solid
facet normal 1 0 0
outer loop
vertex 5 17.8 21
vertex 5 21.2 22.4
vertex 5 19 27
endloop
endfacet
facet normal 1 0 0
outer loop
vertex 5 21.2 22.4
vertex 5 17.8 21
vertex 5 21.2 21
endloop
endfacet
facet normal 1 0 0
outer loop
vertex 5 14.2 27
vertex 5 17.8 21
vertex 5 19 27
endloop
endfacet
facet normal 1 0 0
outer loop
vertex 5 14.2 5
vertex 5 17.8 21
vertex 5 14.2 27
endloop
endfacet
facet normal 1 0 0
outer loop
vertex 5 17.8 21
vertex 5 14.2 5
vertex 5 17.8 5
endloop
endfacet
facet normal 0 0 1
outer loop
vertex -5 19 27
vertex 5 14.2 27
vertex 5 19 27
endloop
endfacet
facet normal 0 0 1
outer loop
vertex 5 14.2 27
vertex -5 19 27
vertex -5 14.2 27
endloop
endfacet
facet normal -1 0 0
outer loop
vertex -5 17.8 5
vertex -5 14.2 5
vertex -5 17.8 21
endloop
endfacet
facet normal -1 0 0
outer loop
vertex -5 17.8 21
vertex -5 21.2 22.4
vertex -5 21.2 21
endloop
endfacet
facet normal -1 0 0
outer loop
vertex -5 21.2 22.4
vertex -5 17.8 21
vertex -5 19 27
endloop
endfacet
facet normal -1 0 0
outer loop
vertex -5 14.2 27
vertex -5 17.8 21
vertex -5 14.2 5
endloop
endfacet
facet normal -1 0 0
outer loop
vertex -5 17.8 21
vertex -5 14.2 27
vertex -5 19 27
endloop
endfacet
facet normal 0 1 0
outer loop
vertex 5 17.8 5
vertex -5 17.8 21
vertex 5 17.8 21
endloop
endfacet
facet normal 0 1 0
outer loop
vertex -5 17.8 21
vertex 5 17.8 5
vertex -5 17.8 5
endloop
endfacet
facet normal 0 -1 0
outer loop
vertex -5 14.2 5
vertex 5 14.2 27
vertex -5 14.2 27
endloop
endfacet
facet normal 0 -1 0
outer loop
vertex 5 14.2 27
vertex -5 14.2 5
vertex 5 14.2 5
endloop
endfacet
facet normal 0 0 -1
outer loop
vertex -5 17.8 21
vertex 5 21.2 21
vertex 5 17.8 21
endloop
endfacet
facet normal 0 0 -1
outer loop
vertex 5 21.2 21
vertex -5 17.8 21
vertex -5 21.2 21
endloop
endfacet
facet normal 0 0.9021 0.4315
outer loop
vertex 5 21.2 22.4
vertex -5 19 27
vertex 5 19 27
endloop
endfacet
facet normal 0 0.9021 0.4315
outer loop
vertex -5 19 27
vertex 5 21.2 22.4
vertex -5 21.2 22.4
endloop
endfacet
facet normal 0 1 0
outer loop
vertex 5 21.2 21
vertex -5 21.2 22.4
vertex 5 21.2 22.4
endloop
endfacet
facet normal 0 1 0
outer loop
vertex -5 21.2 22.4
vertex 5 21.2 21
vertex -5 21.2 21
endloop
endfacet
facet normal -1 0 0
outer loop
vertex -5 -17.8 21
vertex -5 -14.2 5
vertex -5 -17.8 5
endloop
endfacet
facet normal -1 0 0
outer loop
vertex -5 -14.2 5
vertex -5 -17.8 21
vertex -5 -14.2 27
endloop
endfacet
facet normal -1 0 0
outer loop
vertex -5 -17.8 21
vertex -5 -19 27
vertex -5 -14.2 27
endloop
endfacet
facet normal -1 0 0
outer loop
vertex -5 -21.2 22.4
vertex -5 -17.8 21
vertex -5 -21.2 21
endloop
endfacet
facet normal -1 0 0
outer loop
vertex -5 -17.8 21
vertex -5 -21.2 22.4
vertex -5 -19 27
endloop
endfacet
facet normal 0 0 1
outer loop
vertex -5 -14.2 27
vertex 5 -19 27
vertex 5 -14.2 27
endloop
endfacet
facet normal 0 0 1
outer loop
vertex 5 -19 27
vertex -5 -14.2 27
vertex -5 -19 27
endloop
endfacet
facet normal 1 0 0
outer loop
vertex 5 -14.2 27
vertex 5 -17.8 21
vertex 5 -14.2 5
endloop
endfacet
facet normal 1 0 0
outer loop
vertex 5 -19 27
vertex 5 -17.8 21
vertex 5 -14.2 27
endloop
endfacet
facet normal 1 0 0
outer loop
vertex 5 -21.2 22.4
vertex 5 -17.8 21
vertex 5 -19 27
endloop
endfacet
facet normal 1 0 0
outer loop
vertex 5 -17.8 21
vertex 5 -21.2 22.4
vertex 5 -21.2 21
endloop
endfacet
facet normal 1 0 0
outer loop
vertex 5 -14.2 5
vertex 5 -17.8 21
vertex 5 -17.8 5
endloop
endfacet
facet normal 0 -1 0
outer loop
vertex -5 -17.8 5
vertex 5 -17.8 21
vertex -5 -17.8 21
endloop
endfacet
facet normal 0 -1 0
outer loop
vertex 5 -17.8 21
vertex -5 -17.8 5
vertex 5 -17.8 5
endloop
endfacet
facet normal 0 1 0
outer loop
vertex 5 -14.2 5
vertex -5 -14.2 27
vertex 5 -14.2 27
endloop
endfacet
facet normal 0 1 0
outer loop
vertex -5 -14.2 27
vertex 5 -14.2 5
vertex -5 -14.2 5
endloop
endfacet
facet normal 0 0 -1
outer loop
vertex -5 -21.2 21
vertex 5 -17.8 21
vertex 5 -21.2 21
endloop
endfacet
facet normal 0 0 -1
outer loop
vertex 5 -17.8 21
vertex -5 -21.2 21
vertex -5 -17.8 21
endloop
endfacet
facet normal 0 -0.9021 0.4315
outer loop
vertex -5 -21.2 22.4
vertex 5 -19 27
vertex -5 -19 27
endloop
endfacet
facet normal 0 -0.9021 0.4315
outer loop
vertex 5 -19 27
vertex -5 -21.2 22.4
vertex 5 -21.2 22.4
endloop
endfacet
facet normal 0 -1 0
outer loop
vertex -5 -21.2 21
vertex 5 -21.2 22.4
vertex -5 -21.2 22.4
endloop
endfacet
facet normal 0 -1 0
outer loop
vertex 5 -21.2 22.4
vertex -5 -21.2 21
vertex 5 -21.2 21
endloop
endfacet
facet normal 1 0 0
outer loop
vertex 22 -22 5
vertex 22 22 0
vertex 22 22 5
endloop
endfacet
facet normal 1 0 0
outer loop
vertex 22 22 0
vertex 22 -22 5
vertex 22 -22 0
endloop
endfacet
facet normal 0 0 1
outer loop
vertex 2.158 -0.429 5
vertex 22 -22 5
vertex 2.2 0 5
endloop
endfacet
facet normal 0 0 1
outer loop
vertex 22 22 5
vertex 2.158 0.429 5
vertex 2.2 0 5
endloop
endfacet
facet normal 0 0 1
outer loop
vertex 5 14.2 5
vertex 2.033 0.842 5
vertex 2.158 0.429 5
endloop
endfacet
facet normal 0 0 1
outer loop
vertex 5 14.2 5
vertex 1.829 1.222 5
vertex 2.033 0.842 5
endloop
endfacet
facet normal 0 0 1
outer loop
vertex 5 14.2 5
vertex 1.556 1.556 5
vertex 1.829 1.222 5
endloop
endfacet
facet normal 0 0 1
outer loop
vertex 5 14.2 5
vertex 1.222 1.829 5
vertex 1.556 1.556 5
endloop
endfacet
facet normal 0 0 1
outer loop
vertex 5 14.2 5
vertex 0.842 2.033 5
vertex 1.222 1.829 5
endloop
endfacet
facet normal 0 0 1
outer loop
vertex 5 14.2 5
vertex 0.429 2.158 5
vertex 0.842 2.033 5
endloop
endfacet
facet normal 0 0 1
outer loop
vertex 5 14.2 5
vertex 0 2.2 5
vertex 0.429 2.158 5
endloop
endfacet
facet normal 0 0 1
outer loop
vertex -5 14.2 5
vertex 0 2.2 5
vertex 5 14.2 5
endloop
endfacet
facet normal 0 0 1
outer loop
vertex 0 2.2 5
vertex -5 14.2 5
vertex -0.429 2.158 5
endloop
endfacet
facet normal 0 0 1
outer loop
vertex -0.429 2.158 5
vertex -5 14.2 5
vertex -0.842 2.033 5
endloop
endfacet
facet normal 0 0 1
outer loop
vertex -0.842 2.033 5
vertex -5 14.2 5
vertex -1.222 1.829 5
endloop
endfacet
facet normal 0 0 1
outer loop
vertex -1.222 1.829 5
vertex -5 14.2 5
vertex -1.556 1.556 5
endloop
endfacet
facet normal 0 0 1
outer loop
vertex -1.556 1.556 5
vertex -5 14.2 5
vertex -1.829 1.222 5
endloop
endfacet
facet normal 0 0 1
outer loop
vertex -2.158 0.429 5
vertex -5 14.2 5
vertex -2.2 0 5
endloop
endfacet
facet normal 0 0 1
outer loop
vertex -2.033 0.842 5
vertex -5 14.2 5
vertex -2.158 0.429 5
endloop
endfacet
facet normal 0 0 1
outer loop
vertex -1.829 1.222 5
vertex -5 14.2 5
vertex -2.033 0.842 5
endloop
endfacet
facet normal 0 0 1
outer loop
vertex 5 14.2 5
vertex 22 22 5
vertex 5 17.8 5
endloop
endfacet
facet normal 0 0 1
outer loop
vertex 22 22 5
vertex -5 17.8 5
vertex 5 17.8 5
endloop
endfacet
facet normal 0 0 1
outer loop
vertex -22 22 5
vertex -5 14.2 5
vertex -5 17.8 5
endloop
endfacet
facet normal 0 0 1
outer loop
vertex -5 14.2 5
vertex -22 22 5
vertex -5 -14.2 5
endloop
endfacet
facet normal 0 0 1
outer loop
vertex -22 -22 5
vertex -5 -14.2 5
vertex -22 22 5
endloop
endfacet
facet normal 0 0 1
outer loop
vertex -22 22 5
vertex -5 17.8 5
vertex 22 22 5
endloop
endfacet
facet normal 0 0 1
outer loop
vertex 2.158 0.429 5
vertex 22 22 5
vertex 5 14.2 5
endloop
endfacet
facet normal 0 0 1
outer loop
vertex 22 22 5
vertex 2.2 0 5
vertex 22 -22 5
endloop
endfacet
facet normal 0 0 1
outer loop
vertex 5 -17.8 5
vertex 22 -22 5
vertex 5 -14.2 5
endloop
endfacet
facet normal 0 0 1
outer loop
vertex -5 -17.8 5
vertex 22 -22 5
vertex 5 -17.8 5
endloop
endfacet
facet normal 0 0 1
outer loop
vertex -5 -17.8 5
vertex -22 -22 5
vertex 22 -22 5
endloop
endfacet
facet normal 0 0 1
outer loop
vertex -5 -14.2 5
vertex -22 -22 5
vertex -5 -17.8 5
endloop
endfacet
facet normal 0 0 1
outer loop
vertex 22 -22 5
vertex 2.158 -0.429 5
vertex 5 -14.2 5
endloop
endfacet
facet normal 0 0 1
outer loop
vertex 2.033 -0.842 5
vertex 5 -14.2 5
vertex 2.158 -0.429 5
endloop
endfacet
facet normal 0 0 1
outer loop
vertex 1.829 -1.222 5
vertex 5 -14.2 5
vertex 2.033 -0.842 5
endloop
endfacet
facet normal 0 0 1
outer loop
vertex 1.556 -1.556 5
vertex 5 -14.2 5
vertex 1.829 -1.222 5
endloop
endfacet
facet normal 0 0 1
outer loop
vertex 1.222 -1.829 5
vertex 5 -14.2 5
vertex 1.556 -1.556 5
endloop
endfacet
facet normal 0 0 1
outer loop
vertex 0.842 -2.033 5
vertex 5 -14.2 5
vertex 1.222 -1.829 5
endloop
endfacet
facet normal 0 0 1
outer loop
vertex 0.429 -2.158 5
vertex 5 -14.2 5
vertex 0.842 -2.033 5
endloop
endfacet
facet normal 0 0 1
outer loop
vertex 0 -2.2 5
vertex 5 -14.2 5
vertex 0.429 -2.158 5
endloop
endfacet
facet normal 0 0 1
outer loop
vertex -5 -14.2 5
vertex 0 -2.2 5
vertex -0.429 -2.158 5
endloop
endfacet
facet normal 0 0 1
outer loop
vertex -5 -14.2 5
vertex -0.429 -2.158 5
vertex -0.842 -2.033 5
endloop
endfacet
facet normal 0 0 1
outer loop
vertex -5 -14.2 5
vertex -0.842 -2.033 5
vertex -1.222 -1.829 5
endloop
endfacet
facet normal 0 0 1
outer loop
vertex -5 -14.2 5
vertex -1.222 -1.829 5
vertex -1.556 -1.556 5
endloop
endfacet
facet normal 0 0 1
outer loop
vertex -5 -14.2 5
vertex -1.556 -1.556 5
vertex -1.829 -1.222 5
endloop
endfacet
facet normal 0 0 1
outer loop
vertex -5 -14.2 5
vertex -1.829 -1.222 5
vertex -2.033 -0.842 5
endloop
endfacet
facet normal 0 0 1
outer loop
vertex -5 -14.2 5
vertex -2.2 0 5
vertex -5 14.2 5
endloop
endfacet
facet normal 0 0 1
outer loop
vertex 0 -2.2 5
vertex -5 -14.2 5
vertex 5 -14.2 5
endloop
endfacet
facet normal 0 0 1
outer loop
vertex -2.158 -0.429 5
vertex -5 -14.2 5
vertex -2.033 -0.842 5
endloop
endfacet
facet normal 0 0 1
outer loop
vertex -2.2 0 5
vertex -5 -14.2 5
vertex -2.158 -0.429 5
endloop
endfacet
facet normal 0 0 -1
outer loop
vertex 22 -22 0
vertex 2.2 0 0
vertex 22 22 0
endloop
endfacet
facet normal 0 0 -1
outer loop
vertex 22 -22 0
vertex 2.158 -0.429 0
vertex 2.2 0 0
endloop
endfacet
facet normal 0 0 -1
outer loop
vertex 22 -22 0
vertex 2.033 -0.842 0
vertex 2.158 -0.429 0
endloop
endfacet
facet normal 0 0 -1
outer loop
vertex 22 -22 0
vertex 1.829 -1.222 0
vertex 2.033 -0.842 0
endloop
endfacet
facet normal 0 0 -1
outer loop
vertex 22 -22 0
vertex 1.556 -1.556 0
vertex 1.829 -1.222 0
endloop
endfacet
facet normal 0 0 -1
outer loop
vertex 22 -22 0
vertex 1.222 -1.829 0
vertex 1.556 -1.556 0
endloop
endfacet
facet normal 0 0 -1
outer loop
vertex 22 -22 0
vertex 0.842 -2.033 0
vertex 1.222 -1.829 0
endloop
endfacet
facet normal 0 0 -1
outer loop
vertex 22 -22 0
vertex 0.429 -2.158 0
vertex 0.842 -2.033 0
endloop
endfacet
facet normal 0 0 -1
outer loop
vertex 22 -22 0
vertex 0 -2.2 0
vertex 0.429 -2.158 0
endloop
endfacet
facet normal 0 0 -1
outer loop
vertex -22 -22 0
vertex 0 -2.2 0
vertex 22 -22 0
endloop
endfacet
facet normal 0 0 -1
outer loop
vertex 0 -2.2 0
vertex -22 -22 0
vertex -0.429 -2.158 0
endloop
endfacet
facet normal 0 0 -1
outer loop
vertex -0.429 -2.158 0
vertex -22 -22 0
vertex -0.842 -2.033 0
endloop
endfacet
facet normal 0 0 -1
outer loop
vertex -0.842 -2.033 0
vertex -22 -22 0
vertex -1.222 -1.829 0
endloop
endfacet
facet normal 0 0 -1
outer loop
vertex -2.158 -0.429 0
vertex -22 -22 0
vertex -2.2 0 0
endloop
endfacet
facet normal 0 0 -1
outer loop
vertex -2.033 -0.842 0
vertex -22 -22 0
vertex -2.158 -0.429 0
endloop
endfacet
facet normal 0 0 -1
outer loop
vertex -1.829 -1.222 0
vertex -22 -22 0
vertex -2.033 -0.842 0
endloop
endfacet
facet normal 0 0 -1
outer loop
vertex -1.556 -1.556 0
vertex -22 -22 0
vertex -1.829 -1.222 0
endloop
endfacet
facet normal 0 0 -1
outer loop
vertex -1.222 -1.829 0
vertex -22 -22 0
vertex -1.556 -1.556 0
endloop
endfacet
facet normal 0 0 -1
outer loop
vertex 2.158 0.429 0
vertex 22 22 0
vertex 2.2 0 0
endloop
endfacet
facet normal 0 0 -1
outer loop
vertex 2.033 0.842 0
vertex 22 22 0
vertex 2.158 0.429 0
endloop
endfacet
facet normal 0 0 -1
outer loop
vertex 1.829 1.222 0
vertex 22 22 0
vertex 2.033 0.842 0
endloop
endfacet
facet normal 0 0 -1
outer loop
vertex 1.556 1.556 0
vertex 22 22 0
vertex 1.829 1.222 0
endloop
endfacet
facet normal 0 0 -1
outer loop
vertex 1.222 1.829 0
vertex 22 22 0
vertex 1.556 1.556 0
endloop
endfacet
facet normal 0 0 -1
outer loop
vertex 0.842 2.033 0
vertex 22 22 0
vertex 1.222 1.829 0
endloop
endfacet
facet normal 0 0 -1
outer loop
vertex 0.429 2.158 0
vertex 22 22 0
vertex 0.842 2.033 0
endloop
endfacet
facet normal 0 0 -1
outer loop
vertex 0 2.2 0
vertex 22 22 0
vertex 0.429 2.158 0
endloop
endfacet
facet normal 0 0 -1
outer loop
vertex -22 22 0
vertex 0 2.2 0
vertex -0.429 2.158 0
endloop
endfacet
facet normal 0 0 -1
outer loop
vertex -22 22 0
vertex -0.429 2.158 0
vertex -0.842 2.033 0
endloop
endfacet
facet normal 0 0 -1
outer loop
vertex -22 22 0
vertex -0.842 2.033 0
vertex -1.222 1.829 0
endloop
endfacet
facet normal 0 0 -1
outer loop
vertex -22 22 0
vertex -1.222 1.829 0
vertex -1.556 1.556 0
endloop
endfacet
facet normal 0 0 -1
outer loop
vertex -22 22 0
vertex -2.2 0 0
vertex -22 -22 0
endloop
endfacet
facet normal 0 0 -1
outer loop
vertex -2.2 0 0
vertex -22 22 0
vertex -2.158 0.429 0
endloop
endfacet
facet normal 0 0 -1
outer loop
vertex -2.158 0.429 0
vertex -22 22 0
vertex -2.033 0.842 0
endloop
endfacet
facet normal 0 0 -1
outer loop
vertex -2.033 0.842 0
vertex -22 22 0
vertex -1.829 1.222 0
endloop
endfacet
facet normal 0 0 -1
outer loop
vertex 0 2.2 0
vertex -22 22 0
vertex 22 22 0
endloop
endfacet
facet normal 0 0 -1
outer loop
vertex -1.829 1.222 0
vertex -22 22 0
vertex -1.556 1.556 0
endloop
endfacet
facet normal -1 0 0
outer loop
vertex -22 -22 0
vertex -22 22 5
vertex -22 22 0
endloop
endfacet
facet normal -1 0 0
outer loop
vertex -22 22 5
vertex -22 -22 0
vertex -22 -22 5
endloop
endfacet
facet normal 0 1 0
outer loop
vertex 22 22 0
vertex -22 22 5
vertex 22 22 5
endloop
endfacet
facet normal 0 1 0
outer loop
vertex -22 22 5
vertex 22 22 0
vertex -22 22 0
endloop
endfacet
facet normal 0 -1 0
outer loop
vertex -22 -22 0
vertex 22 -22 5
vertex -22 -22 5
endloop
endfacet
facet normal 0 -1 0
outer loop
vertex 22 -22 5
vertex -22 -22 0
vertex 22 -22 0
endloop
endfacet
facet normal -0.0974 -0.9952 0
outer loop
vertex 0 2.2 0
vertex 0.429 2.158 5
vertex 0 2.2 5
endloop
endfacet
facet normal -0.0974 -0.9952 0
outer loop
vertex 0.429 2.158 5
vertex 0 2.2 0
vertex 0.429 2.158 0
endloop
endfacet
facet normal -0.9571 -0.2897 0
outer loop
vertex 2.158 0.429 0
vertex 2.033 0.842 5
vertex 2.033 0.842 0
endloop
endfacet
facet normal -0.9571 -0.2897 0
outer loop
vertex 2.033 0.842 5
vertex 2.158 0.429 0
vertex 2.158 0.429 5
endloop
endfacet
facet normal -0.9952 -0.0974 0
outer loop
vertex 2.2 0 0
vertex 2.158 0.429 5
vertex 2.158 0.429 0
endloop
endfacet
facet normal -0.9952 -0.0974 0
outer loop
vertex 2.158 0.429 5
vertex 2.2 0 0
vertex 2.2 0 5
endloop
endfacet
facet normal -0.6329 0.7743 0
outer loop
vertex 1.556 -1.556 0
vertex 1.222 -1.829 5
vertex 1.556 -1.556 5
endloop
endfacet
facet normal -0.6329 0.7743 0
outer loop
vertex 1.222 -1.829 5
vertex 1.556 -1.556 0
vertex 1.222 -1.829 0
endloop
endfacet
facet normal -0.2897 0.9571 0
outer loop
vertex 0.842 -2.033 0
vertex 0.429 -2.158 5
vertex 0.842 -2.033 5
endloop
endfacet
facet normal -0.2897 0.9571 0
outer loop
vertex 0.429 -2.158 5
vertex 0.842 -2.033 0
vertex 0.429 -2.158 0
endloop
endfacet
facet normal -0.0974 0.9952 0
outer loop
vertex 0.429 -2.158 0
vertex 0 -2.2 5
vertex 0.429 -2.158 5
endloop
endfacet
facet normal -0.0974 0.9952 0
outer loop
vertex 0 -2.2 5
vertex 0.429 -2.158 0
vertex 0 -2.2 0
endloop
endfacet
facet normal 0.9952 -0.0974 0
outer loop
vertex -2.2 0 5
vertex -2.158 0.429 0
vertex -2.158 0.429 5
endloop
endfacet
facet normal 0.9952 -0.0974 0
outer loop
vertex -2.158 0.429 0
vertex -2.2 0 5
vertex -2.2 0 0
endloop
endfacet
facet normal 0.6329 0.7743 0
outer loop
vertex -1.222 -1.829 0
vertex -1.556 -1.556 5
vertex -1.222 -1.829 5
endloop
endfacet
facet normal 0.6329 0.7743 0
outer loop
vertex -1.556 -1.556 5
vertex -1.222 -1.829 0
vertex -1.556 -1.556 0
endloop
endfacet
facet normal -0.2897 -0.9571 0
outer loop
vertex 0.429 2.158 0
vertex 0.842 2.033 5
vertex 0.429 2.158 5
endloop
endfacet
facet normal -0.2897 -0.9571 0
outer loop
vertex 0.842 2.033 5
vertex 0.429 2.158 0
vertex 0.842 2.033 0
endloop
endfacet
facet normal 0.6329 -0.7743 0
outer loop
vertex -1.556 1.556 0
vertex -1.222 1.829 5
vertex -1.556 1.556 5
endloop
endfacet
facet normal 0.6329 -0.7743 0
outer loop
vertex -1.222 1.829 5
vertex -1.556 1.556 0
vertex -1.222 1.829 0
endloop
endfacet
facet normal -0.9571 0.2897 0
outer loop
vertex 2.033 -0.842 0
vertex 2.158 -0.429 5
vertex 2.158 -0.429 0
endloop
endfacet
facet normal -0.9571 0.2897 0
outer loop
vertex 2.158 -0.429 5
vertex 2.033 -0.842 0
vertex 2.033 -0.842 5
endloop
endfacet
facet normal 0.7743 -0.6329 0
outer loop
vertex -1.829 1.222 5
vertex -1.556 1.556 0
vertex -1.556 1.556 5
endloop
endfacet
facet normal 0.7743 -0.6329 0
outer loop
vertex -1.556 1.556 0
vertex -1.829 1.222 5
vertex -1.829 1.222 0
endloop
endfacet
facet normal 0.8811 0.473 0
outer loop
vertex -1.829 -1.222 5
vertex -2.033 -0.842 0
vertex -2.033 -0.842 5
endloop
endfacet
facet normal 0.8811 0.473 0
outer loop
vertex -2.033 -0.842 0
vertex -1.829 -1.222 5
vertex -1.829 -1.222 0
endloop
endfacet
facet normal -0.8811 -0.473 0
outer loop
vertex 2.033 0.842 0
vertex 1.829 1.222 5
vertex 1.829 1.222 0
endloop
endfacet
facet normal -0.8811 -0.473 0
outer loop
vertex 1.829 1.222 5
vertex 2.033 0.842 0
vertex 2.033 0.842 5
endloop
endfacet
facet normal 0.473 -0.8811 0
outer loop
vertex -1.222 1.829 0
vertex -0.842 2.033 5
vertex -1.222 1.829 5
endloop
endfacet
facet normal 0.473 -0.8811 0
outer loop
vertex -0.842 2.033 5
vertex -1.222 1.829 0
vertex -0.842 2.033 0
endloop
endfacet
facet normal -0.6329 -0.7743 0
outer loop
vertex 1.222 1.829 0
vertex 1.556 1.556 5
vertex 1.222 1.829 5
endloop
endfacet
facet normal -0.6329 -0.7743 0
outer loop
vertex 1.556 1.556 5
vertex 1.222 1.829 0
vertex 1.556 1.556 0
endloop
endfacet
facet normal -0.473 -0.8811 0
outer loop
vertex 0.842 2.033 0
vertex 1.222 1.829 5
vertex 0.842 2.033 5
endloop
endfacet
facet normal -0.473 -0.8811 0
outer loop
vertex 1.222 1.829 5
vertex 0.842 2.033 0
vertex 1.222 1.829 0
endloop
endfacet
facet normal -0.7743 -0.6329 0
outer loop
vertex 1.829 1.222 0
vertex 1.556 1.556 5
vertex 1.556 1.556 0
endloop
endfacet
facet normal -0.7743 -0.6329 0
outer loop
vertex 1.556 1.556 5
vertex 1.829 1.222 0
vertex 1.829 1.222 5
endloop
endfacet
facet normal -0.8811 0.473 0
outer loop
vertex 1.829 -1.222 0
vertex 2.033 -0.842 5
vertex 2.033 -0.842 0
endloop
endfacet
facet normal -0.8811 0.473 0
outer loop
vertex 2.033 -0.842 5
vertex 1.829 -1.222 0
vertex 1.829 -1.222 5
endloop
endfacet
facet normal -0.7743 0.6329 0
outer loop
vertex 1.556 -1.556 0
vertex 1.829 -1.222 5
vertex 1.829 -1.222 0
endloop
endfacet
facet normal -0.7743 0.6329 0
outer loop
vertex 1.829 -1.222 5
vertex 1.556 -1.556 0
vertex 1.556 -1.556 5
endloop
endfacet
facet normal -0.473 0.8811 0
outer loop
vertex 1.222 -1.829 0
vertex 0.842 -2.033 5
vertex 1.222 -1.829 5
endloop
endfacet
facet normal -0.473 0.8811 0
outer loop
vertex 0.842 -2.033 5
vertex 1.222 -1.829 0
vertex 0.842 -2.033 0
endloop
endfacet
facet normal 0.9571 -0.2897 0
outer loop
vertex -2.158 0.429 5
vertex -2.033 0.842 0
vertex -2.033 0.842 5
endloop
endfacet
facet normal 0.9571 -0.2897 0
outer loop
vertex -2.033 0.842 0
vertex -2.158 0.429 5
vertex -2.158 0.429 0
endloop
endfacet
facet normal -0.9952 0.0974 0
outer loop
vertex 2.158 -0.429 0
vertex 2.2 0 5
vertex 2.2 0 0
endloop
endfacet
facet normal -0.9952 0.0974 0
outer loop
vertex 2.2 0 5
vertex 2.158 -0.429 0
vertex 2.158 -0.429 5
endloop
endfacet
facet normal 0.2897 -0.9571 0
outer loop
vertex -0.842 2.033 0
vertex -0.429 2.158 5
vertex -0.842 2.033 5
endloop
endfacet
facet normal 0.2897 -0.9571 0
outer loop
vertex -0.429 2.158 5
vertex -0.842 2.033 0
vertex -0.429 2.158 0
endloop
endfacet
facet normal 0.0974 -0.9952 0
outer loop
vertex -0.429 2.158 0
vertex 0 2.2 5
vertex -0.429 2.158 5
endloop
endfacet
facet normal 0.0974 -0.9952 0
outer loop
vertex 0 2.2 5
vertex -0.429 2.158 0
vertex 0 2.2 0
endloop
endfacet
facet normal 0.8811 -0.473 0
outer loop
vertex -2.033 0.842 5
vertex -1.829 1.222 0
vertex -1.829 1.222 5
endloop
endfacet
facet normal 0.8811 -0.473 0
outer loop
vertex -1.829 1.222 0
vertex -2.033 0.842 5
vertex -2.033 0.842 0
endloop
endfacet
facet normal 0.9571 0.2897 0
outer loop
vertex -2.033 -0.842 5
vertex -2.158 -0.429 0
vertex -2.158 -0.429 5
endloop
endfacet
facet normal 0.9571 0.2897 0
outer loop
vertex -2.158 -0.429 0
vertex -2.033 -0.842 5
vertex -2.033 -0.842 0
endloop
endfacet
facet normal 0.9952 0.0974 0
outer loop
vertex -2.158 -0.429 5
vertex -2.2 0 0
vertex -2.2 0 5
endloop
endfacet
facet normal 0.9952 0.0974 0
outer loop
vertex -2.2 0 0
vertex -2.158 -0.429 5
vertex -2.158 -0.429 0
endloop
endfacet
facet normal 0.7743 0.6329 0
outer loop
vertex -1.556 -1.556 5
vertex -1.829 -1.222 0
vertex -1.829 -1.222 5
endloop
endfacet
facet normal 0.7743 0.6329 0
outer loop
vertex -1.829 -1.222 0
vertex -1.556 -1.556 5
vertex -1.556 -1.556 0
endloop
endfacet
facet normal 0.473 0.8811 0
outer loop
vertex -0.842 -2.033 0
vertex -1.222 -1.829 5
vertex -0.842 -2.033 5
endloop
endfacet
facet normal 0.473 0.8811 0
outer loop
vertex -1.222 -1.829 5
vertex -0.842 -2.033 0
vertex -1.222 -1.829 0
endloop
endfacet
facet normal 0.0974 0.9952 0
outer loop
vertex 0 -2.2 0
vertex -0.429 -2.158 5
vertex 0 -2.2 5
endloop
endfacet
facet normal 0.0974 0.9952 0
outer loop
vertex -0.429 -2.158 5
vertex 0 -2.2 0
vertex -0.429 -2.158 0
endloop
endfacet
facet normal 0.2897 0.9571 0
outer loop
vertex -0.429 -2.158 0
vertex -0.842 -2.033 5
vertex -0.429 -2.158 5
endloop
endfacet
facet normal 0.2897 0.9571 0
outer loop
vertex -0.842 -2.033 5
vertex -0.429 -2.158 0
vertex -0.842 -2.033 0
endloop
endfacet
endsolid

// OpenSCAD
$fn = 32;

// ----------------------------------------------------------------------
// Snap-fit latch: 2 arms, 22 mm tall, 3.6 mm undercut hooks
// ----------------------------------------------------------------------

// --- parameters (mm) ---
base_d = 44;              // base plate depth
base_h = 5;               // base plate thickness
span = 32;                // distance between opposite arms
arm_t = 3.6;              // arm thickness
arm_d = 10;               // arm width
height = 22;              // free arm length
head_len = 3.6;           // hook reach
head_h = 6;               // hook height
lead = 1.4;               // lead-in ramp thickness
bore_d = 4.4;             // base fixing bore
top_z = 27;               // height of the arm tips above the base

arms = 2;

difference() {
  union() {
    /* base plate, centred on the arm ring */
    translate([-22, -22, 0]) cube([base_d, base_d, base_h]);
    for (a = [0 : 360 / arms : 359]) rotate([0, 0, a]) {
    /* arm, sunk 0.5 mm into the base */
    translate([-arm_d / 2, span / 2 - arm_t / 2, base_h - 0.5]) cube([arm_d, arm_t, height + 0.5]);
    /* hook: a convex hull of a tall inner block and a thin outer lip
       gives a flat undercut below and a lead-in ramp on top */
    hull() {
      translate([-arm_d / 2, span / 2 + arm_t / 2 - 0.6, top_z - head_h]) cube([arm_d, lead + 0.4, head_h]);
      translate([-arm_d / 2, span / 2 + arm_t / 2 - 0.2, top_z - head_h]) cube([arm_d, head_len, lead]);
    }
    }
  }
  translate([0, 0, -2.5]) cylinder(h = base_h + 5, d = bore_d);
}
